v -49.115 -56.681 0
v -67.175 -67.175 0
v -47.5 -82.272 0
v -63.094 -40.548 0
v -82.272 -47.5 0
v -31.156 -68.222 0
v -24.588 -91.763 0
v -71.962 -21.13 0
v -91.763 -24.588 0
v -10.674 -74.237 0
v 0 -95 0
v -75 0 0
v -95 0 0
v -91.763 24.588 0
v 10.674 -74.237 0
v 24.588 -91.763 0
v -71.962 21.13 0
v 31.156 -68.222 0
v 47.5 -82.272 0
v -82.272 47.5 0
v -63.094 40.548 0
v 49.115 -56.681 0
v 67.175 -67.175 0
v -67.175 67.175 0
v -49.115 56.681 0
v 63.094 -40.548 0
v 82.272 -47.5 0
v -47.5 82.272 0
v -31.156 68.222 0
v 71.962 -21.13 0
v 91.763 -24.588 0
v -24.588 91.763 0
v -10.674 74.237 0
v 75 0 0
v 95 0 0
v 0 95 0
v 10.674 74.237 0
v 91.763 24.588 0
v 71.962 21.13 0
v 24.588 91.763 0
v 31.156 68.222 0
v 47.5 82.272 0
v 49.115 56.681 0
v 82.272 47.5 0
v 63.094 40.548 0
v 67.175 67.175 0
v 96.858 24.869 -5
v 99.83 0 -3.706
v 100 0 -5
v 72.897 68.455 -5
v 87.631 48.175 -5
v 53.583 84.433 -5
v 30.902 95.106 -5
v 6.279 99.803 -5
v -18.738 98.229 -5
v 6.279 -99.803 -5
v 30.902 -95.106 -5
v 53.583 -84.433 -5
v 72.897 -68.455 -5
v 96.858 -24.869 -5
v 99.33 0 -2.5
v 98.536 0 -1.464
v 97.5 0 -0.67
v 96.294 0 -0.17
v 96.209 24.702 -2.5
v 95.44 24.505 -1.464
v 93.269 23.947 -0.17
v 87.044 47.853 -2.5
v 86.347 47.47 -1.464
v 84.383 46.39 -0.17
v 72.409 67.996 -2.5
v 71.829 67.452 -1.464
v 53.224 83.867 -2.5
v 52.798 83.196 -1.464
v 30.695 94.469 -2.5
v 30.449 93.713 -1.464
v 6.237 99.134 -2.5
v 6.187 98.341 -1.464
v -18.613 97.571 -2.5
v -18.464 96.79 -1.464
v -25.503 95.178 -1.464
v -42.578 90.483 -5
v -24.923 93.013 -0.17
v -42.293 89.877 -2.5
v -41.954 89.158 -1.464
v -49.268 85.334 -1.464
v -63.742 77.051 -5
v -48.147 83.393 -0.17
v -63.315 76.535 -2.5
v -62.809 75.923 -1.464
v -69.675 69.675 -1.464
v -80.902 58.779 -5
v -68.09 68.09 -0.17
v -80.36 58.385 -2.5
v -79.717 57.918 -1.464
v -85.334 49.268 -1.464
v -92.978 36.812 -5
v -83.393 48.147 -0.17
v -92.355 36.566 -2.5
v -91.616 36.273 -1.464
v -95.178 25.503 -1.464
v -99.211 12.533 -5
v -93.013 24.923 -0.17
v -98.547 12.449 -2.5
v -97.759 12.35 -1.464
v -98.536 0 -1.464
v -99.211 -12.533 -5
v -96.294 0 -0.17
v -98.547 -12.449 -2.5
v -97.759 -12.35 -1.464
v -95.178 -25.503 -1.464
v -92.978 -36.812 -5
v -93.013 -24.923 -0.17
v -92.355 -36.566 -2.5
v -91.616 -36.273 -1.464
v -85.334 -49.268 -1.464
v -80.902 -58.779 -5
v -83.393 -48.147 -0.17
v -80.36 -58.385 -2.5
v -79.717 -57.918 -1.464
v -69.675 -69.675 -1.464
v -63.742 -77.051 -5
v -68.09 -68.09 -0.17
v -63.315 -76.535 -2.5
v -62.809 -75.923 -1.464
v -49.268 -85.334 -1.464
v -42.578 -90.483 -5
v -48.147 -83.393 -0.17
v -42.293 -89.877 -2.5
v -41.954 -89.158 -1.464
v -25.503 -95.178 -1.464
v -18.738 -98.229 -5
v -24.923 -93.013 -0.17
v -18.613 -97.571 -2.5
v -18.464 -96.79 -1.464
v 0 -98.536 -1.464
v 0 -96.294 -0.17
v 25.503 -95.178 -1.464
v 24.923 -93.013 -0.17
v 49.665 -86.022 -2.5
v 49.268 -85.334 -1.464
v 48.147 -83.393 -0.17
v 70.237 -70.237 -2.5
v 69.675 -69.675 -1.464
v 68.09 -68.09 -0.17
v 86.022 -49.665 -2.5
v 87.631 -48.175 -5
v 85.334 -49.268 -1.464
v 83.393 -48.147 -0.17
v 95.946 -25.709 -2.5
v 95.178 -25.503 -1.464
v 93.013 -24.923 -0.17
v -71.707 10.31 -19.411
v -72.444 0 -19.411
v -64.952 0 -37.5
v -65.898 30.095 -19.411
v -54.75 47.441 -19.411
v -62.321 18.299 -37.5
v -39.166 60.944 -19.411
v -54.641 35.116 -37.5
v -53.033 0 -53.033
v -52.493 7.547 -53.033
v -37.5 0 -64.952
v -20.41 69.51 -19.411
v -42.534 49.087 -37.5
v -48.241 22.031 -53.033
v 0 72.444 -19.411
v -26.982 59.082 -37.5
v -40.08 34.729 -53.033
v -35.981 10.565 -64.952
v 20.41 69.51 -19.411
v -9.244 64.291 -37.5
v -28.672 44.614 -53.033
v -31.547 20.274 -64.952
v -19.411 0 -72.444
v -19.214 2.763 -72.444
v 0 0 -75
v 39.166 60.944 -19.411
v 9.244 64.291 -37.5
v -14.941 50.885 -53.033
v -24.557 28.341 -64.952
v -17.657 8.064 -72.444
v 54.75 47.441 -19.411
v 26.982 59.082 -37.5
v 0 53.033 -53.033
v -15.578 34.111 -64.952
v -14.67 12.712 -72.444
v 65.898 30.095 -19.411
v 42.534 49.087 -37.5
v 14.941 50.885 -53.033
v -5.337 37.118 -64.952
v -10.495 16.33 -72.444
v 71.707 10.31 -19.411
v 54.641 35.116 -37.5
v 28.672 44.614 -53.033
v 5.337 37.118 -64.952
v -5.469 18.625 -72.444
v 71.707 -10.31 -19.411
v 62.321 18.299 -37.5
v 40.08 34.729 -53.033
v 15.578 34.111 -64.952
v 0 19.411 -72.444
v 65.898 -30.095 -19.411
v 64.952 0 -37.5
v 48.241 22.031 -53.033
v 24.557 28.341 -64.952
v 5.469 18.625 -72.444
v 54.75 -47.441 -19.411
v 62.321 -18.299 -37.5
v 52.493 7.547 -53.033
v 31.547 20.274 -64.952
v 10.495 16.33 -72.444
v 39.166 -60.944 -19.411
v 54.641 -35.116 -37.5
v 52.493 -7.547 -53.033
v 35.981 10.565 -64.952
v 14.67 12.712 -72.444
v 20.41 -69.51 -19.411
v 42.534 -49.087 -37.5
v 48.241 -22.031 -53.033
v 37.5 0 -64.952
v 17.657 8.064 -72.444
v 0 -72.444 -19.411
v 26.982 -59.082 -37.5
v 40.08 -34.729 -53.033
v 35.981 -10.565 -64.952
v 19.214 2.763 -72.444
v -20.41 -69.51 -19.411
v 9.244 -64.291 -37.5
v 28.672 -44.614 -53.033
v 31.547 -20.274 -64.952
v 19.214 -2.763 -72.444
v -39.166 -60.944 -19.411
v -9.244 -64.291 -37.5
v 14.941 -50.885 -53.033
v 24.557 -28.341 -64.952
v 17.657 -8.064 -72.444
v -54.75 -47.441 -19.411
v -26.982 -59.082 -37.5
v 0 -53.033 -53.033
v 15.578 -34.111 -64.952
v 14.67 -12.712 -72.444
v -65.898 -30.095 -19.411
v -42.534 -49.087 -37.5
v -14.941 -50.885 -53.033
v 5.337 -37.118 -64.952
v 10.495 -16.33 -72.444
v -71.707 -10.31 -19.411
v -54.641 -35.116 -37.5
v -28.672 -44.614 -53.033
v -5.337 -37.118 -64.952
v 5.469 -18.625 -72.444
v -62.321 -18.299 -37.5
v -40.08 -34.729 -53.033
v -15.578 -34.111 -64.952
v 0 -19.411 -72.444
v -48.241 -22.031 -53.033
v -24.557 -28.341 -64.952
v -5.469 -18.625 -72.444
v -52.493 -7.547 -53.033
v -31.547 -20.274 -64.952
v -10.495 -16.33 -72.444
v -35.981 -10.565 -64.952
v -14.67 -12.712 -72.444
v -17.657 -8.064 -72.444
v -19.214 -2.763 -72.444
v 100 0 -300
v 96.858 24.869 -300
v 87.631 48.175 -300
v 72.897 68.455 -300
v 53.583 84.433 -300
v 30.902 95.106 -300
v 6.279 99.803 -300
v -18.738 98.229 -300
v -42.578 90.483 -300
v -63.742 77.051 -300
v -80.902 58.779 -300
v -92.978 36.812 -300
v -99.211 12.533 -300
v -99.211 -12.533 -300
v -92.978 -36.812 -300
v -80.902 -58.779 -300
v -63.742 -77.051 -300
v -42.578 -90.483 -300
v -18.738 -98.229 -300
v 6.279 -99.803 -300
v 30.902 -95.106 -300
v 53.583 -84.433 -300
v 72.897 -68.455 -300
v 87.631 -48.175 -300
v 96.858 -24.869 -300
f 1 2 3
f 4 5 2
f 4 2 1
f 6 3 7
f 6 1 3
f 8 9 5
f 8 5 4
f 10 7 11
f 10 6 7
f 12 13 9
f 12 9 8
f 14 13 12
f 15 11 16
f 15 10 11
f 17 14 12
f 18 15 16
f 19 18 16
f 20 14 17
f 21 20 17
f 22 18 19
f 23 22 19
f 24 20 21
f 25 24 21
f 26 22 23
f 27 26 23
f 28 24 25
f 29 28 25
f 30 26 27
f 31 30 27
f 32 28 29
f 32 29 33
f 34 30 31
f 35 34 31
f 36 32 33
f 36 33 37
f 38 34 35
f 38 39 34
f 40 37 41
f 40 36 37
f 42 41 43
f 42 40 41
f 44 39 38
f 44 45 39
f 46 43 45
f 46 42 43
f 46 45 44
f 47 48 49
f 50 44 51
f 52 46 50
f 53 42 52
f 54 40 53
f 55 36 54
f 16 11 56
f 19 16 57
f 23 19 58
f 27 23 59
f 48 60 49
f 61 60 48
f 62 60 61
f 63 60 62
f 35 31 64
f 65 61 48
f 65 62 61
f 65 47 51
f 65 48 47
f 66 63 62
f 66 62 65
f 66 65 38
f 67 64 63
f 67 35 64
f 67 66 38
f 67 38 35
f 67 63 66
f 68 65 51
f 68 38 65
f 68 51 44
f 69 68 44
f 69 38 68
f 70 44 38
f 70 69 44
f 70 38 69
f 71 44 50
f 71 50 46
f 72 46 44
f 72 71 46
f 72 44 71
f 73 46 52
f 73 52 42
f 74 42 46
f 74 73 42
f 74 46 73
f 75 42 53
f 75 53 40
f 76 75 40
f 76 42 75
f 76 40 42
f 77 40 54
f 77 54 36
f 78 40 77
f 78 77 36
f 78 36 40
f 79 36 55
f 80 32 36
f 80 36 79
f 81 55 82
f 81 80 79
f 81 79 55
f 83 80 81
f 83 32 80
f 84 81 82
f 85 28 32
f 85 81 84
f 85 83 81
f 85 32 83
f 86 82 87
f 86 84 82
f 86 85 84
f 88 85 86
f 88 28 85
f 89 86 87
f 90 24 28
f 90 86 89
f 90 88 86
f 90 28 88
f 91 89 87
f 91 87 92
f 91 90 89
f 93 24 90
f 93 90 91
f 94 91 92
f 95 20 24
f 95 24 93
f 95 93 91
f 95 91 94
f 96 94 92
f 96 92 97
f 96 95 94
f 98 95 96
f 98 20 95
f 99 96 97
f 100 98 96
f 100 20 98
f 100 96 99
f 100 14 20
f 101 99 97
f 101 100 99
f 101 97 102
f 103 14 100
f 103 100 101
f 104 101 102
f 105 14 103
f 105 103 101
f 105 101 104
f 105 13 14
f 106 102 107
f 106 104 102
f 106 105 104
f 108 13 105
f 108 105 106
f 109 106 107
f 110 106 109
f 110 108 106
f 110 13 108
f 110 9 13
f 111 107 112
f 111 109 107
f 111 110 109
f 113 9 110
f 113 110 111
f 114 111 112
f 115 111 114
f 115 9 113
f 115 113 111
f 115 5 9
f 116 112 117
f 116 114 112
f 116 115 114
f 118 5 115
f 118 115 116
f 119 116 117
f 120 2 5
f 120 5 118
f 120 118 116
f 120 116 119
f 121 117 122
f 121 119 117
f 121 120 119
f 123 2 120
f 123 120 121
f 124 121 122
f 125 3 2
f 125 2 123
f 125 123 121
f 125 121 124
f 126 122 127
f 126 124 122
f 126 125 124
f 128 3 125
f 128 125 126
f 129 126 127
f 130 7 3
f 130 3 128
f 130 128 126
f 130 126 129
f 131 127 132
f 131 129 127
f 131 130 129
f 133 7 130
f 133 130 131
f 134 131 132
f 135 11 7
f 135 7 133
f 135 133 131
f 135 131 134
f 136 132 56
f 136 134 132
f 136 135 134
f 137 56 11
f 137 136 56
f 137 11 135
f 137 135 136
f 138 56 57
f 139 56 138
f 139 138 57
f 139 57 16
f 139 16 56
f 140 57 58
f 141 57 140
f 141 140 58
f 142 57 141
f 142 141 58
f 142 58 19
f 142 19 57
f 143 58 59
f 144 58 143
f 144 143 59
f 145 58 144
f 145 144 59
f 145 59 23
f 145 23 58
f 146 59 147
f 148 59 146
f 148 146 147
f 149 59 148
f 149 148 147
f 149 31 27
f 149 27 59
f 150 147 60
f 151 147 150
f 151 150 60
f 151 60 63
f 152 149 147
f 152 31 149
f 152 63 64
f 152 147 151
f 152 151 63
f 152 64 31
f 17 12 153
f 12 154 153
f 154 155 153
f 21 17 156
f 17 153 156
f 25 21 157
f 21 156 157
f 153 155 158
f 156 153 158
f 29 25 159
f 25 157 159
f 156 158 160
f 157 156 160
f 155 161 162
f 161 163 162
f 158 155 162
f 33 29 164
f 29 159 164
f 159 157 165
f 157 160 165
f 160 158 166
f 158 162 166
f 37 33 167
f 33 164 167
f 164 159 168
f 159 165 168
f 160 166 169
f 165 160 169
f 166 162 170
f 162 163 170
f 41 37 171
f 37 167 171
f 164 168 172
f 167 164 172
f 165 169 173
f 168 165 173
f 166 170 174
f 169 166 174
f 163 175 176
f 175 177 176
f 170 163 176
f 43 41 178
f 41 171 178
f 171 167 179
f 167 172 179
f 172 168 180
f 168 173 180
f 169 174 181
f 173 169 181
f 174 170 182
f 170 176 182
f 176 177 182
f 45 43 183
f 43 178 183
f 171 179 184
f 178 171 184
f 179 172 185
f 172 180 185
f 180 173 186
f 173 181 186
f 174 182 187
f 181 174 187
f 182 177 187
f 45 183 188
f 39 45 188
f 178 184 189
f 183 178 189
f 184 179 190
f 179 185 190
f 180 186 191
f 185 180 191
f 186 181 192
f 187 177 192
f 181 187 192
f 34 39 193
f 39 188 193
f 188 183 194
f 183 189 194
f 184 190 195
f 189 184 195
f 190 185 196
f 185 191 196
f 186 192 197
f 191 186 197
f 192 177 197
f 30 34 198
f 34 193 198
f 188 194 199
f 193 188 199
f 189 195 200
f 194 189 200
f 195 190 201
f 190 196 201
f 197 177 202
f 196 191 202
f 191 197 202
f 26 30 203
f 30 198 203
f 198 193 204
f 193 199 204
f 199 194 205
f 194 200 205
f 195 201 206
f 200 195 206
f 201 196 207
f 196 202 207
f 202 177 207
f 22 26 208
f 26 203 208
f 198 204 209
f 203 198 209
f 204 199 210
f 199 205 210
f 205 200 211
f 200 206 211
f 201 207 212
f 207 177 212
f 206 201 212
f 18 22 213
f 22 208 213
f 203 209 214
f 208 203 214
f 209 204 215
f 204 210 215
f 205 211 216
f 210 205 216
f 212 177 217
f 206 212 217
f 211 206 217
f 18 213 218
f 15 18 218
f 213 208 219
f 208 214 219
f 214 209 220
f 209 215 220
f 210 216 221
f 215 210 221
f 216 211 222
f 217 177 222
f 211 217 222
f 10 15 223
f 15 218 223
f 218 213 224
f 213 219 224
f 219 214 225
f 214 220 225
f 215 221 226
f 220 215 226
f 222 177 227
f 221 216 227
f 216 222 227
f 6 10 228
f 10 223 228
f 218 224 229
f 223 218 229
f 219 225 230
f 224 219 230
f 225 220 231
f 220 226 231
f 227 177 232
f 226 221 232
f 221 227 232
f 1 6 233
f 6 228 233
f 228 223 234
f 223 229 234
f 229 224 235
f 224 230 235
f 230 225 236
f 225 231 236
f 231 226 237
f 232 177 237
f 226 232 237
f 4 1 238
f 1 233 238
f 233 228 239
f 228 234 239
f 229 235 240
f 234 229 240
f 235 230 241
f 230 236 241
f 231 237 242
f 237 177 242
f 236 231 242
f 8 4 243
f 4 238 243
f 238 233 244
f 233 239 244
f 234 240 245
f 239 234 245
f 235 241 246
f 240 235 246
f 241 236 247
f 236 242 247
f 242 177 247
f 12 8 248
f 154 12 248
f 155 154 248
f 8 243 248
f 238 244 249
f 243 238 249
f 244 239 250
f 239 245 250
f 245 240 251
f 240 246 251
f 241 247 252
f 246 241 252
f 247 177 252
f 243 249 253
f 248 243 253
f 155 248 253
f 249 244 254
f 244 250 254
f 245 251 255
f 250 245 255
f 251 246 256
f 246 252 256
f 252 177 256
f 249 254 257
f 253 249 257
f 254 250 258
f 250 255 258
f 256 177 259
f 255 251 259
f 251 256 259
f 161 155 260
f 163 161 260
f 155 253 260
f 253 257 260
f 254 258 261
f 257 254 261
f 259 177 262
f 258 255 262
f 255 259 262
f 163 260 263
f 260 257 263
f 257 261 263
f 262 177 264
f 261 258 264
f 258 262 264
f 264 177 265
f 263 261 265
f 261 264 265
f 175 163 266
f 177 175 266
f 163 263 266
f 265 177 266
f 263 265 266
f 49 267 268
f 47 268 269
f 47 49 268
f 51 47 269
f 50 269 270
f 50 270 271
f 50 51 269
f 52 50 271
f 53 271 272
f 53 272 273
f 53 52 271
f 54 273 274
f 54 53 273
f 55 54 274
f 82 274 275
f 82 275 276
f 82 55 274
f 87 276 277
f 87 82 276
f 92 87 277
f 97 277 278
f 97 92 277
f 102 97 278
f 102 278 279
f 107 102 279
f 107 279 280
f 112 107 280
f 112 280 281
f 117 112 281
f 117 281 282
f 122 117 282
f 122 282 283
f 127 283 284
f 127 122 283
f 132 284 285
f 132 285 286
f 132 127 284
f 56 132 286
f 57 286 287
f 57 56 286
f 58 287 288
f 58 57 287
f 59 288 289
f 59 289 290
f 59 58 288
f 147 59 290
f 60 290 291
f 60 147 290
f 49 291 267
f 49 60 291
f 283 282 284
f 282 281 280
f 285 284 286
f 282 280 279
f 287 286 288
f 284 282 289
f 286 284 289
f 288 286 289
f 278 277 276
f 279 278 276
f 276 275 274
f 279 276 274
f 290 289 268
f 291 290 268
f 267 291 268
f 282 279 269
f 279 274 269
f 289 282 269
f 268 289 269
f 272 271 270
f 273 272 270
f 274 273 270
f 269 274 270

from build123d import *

# Parameters (mm, degrees)
F0_R     = 100
F1_DEPTH = 300
F4_R     = 5


with BuildPart() as f1:
    # F0 (on Top) → F1 (new body)
    with BuildSketch(Plane.XY):
        Circle(F0_R)
    extrude(amount=-F1_DEPTH)

    # F2 (on Front) → F3 (revolve, cut)
    with BuildSketch(Plane.XZ):
        with BuildLine():
            Line((0, -75), (0, 75))
            ThreePointArc((0, 75), (-75, 0), (0, -75))
        make_face()
    revolve(axis=Axis((0, 0, 0), (0, 0, -1)), mode=Mode.SUBTRACT)

    # F4
    f4_edges = [f1.edges().sort_by_distance(p)[0] for p in [
        (-100, 0, 0),
    ]]
    fillet(f4_edges, radius=F4_R)


solid = f1.part
